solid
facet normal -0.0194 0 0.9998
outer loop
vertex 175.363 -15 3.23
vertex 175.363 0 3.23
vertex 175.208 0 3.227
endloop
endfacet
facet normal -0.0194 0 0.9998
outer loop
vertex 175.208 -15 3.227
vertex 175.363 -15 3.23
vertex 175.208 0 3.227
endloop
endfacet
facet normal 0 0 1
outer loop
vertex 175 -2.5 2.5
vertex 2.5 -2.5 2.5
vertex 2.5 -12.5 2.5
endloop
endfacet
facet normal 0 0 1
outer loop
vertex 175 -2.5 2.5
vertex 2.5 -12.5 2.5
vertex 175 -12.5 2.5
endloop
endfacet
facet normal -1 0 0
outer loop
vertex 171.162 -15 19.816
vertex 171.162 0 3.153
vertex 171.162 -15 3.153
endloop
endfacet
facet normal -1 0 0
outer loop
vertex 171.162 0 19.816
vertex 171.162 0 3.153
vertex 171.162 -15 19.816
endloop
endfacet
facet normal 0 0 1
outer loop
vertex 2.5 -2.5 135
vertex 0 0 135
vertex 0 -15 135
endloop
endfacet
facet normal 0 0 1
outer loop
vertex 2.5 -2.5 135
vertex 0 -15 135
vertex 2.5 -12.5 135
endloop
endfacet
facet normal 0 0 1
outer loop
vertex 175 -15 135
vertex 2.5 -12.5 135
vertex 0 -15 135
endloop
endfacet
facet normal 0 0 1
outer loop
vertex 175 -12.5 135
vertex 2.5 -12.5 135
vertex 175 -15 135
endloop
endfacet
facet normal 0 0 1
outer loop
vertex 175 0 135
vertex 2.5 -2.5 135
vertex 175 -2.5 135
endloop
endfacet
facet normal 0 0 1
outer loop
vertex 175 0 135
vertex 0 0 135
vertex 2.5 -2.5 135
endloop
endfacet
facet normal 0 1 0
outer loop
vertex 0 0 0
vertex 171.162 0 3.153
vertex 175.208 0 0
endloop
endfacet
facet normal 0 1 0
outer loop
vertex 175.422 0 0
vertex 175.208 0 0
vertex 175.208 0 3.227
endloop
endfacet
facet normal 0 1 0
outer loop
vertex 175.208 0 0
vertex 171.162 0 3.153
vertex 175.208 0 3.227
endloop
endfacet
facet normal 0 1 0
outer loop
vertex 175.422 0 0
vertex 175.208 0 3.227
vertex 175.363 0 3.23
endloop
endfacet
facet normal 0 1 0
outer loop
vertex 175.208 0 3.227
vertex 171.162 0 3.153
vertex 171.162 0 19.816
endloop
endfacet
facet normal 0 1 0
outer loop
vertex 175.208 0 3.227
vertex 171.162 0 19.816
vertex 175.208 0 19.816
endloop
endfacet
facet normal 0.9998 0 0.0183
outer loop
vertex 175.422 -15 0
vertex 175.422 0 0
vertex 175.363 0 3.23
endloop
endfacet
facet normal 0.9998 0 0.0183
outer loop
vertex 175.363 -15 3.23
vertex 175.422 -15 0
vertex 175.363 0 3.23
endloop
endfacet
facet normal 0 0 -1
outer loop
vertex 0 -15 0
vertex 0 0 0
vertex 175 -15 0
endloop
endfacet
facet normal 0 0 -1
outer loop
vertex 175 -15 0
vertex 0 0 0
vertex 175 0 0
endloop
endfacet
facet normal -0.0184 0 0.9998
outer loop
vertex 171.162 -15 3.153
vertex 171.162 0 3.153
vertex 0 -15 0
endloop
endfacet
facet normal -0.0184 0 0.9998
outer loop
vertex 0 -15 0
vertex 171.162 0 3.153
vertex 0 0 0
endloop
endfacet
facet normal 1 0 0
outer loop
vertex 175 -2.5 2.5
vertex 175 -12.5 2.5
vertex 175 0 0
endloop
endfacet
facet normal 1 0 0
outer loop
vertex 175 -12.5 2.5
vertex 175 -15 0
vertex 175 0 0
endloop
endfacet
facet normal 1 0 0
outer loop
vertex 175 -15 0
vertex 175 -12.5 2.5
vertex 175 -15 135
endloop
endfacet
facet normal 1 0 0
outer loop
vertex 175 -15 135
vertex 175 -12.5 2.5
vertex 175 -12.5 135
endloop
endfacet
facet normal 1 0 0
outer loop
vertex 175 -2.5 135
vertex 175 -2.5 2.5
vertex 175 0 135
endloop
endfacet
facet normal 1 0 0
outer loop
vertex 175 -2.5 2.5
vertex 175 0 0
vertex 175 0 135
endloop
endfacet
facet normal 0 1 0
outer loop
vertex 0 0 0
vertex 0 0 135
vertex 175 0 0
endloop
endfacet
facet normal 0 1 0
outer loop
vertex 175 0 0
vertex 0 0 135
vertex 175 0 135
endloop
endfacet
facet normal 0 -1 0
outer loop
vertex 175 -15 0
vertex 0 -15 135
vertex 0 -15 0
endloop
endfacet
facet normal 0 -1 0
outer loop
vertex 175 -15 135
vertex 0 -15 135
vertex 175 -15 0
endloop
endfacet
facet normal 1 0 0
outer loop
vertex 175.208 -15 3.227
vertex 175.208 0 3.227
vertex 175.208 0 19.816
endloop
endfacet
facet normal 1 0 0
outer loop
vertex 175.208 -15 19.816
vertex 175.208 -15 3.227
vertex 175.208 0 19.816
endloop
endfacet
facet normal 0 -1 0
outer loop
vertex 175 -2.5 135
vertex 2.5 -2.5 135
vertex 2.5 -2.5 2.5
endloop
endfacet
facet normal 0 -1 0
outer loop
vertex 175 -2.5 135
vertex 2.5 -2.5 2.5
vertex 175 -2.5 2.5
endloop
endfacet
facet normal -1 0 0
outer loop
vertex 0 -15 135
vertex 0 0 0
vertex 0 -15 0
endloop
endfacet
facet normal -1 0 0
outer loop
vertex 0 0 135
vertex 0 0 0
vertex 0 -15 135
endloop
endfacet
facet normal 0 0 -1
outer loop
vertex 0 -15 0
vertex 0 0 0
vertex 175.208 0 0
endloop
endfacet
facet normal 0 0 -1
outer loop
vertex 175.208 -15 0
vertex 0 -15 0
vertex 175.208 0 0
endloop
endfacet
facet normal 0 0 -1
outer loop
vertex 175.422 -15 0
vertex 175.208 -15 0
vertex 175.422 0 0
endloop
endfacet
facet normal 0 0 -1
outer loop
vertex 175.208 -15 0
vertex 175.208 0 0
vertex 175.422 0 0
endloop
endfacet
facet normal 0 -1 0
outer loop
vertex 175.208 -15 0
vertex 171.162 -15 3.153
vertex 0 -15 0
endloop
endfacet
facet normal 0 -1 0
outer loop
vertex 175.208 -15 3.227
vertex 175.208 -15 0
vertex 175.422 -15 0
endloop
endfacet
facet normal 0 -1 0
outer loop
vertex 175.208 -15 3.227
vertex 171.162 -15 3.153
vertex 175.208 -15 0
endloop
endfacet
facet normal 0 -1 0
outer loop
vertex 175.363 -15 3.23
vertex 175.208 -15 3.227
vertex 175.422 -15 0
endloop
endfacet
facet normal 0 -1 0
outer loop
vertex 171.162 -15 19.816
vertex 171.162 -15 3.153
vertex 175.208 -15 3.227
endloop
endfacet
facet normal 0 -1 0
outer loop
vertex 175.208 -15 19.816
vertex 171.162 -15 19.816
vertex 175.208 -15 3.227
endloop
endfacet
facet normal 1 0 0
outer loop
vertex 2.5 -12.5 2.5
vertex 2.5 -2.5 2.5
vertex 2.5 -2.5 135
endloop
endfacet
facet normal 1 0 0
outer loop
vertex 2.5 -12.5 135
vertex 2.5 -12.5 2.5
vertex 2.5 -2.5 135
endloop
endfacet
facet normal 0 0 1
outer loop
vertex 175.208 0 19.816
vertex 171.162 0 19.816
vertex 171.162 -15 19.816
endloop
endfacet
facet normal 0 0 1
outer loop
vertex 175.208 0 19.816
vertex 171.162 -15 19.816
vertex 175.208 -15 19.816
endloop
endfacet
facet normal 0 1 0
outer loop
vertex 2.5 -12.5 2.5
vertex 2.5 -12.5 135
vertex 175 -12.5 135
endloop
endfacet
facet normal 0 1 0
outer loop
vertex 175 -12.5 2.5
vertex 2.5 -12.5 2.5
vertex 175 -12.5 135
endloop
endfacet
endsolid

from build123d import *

# Parameters (mm, degrees)
F0_W     = 175
F0_H     = 135
F1_DEPTH = 15
F2_T     = -2.5
F4_DEPTH = 15
F5_W     = 4.0458589792
F5_H     = 19.8161639273
F6_DEPTH = 15


with BuildPart() as f1:
    # F0 (on Front) → F1 (new body)
    with BuildSketch(Plane.XZ):
        with Locations((87.5, 67.5)):
            Rectangle(F0_W, F0_H)
    extrude(amount=F1_DEPTH)

    # F2
    f2_openings = [f1.faces().sort_by_distance(p)[0] for p in [
        (87.5, -7.5, 135),
        (175, -7.5, 67.5),
    ]]
    offset(amount=F2_T, openings=f2_openings)


with BuildPart() as f4:
    # F3 (on Front) → F4 (new body)
    with BuildSketch(Plane.XZ):
        Polygon((175.3625184086, 3.230029002), (0, 0), (175.4220128059, 0), align=None)
    extrude(amount=F4_DEPTH)

    # F5 (on face) → F6 (join)
    with BuildSketch(Plane.XZ):
        with Locations((173.1846705079, 9.9080819637)):
            Rectangle(F5_W, F5_H)
    extrude(amount=F6_DEPTH)


solid = Compound([f1.part, f4.part])
